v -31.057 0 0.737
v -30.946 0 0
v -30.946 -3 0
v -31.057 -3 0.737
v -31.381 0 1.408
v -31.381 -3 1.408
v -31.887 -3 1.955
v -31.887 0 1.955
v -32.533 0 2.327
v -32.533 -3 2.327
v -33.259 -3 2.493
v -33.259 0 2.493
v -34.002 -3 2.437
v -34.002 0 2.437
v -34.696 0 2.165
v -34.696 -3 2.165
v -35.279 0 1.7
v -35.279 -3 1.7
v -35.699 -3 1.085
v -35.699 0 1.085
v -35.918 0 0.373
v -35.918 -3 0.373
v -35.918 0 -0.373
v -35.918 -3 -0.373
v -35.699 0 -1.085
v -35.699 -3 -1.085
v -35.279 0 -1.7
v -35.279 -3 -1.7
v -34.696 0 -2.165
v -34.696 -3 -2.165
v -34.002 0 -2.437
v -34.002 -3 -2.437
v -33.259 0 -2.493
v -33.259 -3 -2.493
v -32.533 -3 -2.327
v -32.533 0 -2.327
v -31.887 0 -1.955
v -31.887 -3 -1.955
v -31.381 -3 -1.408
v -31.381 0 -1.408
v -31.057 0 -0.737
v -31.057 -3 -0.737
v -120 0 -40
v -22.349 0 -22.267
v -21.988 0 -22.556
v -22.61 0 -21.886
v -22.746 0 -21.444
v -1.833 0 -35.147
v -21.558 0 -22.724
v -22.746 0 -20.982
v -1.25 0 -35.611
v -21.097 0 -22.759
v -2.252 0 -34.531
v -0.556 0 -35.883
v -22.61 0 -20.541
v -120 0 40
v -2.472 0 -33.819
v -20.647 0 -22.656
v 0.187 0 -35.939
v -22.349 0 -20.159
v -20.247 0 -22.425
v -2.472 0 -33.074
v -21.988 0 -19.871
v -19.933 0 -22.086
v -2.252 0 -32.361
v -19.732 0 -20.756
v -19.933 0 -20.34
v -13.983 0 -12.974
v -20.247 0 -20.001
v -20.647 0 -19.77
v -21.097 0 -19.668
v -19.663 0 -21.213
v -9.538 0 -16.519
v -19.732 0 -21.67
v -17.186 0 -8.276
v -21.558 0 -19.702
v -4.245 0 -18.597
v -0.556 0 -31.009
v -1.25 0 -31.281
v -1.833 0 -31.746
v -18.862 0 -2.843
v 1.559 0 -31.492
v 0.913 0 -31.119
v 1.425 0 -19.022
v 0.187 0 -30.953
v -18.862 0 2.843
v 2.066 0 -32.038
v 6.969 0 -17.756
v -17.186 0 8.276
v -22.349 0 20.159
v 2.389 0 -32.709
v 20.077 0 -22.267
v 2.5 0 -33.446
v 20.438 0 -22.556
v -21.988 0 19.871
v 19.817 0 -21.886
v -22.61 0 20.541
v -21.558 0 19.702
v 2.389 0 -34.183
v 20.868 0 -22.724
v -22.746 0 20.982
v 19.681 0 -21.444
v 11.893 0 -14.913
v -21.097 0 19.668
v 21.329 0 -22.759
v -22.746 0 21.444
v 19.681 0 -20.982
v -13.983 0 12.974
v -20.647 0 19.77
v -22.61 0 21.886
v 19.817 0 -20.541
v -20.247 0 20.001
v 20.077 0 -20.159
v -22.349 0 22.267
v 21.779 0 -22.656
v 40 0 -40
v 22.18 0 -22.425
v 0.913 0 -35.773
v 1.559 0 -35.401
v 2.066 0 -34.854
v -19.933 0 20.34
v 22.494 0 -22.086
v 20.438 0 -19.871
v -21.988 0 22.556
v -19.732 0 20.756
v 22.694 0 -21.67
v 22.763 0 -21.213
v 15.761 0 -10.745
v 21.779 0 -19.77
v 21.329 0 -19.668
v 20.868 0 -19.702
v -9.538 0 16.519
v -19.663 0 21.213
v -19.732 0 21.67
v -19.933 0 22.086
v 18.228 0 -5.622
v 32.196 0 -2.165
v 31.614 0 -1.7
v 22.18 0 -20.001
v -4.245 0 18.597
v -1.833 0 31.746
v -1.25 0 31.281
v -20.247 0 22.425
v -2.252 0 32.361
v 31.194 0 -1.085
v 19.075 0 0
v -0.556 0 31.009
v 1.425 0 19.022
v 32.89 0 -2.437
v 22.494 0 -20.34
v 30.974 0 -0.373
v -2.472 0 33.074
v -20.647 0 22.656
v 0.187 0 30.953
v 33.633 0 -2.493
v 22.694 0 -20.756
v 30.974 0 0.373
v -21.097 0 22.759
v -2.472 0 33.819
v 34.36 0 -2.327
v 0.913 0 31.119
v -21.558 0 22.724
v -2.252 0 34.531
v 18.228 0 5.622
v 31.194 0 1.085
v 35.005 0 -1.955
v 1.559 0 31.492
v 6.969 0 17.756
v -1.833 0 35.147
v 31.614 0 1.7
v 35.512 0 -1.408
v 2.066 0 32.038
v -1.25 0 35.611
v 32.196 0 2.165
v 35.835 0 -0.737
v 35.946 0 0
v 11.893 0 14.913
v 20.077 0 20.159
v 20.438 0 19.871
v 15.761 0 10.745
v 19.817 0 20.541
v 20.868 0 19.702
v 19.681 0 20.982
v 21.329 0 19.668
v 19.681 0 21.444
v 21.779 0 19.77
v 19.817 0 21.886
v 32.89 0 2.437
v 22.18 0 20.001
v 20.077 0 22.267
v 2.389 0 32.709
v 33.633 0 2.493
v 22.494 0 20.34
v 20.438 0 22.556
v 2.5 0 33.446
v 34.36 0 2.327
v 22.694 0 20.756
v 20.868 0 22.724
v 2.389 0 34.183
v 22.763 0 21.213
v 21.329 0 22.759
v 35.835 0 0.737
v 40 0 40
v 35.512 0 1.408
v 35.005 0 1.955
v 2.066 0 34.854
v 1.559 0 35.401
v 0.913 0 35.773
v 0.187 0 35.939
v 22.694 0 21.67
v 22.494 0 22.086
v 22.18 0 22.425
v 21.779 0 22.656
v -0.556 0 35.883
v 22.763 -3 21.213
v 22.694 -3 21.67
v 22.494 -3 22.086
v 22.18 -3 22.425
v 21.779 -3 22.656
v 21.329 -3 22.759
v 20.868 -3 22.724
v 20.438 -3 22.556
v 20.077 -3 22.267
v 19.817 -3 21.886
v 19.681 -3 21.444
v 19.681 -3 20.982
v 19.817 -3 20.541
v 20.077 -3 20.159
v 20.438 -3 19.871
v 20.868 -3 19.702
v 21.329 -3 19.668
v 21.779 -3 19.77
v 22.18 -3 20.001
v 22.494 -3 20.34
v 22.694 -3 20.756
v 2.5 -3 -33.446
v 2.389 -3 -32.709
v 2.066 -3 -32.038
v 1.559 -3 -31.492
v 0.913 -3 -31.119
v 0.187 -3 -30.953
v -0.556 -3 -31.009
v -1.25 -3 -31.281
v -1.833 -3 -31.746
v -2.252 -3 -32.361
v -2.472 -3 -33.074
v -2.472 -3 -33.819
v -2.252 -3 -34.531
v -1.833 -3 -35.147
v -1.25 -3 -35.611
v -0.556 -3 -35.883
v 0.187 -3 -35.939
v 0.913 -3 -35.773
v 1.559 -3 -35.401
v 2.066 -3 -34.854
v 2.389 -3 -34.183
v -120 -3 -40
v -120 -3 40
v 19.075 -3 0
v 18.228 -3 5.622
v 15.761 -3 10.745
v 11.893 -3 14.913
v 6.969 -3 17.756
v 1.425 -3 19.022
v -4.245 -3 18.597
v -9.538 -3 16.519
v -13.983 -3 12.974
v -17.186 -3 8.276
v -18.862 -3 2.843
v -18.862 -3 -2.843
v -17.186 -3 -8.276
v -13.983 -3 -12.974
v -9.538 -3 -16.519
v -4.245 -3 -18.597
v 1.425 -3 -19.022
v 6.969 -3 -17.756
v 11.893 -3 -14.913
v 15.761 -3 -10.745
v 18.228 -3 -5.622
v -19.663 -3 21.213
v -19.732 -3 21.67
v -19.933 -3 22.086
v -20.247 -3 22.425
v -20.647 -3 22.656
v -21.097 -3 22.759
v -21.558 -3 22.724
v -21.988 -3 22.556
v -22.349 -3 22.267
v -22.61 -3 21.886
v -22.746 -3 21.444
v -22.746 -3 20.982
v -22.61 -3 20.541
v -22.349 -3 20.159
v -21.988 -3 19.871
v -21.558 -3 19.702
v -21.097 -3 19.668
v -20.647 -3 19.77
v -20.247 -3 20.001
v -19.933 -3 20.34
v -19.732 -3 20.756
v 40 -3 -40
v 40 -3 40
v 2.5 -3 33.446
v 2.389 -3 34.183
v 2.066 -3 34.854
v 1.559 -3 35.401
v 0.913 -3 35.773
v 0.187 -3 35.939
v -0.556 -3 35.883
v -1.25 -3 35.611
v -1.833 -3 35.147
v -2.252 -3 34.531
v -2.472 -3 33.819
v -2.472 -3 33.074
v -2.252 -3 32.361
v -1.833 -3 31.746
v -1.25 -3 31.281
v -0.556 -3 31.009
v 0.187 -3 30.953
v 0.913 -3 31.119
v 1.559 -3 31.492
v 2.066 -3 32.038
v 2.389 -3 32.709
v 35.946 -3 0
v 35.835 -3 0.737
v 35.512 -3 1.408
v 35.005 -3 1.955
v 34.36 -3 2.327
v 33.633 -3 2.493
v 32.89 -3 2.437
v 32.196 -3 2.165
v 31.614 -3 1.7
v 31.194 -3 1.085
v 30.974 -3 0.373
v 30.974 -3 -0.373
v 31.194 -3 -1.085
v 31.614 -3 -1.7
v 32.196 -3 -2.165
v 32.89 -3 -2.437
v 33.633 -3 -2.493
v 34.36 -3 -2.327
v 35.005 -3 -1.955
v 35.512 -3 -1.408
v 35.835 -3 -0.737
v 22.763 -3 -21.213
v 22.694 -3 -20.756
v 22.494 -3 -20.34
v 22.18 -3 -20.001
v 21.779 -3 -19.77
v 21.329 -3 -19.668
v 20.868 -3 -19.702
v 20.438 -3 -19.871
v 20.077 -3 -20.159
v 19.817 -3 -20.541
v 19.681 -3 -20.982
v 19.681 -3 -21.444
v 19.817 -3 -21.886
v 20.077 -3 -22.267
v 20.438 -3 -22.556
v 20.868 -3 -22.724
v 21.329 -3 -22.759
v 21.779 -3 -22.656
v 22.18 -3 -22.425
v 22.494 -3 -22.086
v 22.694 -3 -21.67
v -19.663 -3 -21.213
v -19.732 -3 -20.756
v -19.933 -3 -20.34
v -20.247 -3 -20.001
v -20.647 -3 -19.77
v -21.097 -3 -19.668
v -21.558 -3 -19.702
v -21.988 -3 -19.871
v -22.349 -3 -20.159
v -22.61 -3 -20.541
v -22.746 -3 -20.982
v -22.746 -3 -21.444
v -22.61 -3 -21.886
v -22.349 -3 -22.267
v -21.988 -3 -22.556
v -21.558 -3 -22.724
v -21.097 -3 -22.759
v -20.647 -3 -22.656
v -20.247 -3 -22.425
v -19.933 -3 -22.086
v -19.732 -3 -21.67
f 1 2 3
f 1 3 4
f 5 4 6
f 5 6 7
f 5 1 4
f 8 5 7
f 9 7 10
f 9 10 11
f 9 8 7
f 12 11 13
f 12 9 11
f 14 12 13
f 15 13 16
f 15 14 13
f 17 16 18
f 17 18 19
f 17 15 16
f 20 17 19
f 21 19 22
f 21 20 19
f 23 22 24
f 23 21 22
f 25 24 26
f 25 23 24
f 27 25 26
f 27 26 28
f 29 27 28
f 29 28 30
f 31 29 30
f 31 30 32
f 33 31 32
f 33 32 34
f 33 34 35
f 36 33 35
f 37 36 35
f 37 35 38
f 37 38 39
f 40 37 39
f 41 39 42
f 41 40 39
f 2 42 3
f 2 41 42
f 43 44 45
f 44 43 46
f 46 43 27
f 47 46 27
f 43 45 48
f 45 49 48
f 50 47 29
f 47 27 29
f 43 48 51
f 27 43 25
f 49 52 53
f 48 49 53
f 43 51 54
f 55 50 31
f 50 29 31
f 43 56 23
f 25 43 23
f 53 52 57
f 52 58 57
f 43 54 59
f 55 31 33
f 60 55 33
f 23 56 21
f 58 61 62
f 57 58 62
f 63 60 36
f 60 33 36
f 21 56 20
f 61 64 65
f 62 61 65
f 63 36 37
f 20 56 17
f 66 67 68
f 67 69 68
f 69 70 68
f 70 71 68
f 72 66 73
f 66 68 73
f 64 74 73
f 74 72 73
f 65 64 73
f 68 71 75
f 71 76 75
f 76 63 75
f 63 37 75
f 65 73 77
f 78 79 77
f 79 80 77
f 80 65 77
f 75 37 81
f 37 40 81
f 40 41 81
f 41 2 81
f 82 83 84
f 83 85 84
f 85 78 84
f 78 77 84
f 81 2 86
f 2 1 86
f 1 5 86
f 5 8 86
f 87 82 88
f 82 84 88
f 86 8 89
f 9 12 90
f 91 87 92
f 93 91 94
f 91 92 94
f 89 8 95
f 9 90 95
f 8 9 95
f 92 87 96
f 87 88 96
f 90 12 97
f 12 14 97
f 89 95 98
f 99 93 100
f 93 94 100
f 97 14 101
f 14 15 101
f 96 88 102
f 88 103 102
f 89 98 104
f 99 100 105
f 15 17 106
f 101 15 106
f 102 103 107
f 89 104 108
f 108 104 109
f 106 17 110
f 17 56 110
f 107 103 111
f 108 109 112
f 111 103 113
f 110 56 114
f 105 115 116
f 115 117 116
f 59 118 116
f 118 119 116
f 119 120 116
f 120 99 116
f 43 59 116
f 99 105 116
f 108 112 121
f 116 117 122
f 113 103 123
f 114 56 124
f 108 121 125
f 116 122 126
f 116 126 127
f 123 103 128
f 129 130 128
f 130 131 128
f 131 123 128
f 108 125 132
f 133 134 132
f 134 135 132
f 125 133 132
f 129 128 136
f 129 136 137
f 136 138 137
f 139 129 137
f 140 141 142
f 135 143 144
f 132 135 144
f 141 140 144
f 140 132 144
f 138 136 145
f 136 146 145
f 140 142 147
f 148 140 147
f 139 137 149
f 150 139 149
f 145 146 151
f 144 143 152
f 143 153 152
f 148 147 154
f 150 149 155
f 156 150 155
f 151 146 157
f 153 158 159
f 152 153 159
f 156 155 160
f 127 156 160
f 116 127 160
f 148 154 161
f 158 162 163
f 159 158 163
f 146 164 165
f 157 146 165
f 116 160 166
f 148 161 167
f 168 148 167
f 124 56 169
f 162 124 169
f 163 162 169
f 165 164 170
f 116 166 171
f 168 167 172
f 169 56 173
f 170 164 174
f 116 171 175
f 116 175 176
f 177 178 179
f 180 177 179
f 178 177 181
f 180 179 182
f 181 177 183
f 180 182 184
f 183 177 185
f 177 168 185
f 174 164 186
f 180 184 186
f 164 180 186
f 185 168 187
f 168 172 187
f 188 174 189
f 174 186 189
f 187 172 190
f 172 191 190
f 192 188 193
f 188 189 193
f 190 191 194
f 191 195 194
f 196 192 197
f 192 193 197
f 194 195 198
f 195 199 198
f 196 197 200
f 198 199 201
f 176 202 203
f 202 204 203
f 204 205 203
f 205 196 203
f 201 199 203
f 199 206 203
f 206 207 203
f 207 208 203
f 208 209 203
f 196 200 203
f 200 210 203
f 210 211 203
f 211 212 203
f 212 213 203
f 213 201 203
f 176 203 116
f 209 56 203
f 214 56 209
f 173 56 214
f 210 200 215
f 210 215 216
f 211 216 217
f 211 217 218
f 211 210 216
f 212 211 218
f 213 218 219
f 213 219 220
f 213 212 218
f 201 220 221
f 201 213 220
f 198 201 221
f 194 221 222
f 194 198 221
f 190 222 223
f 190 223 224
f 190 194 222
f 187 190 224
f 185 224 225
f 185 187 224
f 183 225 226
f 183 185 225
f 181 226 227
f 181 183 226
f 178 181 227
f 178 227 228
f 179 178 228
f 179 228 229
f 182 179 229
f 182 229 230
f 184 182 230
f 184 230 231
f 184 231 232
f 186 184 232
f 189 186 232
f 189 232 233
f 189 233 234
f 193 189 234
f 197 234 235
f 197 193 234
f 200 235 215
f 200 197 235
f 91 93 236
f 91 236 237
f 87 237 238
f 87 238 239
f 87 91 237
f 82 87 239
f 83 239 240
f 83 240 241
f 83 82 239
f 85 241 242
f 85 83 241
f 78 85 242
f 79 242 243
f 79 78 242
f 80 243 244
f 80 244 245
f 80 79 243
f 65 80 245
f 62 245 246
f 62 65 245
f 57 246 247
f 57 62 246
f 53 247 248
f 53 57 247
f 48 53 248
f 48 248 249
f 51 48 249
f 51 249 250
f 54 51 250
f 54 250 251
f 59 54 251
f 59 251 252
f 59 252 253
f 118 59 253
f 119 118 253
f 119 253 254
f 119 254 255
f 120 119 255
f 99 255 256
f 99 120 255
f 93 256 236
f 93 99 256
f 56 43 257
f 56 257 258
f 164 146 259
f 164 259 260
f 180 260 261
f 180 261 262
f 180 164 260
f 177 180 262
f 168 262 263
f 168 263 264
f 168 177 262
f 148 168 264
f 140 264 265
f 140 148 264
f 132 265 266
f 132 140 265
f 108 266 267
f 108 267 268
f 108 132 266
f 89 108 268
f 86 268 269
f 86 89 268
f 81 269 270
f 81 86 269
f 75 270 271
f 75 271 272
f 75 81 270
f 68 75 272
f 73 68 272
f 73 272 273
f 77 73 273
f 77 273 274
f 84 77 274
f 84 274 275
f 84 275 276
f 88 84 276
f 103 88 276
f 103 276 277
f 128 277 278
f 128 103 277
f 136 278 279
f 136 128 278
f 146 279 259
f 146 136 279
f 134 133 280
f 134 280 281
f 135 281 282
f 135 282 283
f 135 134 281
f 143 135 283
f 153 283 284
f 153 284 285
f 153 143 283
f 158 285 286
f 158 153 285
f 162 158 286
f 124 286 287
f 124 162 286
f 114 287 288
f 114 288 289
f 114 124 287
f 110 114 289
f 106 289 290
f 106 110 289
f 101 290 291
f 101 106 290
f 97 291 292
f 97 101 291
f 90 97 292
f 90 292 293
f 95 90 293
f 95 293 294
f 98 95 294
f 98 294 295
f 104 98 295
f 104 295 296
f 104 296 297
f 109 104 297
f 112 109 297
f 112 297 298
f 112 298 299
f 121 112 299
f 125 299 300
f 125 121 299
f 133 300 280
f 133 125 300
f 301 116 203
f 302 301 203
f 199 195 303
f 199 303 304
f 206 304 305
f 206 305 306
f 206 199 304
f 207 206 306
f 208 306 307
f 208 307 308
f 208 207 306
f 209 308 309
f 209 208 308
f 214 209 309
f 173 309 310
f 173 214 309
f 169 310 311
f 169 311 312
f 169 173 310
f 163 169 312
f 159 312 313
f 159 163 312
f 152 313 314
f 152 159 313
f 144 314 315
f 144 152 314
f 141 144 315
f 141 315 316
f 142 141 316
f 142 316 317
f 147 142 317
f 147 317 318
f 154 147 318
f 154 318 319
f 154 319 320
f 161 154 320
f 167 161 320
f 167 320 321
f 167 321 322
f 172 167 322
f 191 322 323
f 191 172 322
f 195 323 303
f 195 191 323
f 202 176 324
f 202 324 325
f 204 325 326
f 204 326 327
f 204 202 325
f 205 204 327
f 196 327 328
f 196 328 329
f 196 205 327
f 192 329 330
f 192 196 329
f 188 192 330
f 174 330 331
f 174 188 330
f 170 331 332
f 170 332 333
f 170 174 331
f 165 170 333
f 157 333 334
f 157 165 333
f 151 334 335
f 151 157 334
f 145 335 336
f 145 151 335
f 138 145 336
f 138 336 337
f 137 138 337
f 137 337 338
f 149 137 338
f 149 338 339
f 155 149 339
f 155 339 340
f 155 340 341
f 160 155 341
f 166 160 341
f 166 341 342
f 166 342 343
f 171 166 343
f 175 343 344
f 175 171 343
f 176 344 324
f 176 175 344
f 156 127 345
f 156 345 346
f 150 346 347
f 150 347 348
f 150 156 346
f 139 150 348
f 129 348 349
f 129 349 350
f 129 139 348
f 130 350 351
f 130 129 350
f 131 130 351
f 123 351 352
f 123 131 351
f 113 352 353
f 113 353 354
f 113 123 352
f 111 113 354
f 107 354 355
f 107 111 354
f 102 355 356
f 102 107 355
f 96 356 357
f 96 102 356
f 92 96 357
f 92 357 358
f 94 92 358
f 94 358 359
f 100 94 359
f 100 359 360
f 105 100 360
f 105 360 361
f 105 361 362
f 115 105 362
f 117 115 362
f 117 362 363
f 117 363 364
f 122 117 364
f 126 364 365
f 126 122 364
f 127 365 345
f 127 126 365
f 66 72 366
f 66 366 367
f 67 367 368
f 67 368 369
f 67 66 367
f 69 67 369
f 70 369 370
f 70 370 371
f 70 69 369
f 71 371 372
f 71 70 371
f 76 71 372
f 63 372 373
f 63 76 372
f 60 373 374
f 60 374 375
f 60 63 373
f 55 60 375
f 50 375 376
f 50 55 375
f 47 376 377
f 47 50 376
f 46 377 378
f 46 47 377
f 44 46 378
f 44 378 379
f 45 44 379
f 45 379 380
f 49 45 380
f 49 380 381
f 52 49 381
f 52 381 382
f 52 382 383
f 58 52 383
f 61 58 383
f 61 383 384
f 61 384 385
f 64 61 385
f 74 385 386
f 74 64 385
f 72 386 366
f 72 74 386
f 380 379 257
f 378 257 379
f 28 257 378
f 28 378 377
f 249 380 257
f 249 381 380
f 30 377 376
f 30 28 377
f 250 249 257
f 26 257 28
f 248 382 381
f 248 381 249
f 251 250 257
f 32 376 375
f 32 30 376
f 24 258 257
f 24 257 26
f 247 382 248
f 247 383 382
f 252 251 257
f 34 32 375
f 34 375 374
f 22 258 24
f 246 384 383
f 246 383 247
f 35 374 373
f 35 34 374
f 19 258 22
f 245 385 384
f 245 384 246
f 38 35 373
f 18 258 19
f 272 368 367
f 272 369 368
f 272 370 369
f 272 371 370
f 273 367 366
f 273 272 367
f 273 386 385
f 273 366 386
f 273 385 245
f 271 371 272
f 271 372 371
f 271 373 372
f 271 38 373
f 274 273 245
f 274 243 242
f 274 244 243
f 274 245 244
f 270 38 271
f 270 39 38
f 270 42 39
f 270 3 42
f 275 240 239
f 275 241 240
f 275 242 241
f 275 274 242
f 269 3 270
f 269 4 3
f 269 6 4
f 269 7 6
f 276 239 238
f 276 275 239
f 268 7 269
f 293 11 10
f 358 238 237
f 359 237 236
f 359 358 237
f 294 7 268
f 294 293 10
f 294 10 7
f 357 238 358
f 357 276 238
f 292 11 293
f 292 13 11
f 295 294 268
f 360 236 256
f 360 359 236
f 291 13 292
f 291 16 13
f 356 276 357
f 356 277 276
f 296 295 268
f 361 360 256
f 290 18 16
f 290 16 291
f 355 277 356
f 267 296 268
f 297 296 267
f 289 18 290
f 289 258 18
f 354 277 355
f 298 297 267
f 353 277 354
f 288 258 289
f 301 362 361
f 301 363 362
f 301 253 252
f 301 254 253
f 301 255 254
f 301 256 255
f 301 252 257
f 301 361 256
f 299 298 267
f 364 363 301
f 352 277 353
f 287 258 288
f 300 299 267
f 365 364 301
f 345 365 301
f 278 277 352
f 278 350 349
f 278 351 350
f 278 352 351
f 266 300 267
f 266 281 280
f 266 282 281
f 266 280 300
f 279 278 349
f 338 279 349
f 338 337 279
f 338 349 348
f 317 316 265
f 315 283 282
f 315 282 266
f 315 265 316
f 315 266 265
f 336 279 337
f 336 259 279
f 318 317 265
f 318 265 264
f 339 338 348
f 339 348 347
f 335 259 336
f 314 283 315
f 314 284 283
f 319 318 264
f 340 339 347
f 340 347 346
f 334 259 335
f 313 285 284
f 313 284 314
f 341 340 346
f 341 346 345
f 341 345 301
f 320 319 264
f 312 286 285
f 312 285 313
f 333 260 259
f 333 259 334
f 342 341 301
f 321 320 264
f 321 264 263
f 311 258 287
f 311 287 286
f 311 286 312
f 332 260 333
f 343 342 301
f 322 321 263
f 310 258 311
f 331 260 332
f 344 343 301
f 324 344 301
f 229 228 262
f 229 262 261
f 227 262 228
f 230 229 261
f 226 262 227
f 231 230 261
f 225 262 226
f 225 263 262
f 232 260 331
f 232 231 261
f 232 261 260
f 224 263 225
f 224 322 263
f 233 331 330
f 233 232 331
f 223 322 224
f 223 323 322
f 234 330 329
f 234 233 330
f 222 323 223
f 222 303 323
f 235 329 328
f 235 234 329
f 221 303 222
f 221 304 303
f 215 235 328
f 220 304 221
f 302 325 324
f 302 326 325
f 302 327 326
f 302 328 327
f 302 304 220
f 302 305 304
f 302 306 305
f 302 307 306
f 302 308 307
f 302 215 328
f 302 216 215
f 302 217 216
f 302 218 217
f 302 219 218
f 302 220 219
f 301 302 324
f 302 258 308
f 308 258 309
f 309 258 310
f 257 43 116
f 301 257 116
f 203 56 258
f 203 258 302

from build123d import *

# Parameters (mm, degrees)
F0_W     = 160
F0_H     = 80
F0_R     = 1.55
F0_R_2   = 2.5
F0_R_3   = 19.075
F1_DEPTH = 3


with BuildPart() as f1:
    # F0 (on Front) → F1 (new body)
    with BuildSketch(Plane.XZ):
        with Locations((-40, 0)):
            Rectangle(F0_W, F0_H)
        with Locations((-21.213203, -21.213203)):
            Circle(F0_R, mode=Mode.SUBTRACT)
        with Locations((0, -33.446151)):
            Circle(F0_R_2, mode=Mode.SUBTRACT)
        with Locations((21.213203, -21.213203)):
            Circle(F0_R, mode=Mode.SUBTRACT)
        with Locations((-33.446151, 0)):
            Circle(F0_R_2, mode=Mode.SUBTRACT)
        Circle(F0_R_3, mode=Mode.SUBTRACT)
        with Locations((33.446151, 0)):
            Circle(F0_R_2, mode=Mode.SUBTRACT)
        with Locations((-21.213203, 21.213203)):
            Circle(F0_R, mode=Mode.SUBTRACT)
        with Locations((21.213203, 21.213203)):
            Circle(F0_R, mode=Mode.SUBTRACT)
        with Locations((0, 33.446151)):
            Circle(F0_R_2, mode=Mode.SUBTRACT)
    extrude(amount=F1_DEPTH)


solid = f1.part
